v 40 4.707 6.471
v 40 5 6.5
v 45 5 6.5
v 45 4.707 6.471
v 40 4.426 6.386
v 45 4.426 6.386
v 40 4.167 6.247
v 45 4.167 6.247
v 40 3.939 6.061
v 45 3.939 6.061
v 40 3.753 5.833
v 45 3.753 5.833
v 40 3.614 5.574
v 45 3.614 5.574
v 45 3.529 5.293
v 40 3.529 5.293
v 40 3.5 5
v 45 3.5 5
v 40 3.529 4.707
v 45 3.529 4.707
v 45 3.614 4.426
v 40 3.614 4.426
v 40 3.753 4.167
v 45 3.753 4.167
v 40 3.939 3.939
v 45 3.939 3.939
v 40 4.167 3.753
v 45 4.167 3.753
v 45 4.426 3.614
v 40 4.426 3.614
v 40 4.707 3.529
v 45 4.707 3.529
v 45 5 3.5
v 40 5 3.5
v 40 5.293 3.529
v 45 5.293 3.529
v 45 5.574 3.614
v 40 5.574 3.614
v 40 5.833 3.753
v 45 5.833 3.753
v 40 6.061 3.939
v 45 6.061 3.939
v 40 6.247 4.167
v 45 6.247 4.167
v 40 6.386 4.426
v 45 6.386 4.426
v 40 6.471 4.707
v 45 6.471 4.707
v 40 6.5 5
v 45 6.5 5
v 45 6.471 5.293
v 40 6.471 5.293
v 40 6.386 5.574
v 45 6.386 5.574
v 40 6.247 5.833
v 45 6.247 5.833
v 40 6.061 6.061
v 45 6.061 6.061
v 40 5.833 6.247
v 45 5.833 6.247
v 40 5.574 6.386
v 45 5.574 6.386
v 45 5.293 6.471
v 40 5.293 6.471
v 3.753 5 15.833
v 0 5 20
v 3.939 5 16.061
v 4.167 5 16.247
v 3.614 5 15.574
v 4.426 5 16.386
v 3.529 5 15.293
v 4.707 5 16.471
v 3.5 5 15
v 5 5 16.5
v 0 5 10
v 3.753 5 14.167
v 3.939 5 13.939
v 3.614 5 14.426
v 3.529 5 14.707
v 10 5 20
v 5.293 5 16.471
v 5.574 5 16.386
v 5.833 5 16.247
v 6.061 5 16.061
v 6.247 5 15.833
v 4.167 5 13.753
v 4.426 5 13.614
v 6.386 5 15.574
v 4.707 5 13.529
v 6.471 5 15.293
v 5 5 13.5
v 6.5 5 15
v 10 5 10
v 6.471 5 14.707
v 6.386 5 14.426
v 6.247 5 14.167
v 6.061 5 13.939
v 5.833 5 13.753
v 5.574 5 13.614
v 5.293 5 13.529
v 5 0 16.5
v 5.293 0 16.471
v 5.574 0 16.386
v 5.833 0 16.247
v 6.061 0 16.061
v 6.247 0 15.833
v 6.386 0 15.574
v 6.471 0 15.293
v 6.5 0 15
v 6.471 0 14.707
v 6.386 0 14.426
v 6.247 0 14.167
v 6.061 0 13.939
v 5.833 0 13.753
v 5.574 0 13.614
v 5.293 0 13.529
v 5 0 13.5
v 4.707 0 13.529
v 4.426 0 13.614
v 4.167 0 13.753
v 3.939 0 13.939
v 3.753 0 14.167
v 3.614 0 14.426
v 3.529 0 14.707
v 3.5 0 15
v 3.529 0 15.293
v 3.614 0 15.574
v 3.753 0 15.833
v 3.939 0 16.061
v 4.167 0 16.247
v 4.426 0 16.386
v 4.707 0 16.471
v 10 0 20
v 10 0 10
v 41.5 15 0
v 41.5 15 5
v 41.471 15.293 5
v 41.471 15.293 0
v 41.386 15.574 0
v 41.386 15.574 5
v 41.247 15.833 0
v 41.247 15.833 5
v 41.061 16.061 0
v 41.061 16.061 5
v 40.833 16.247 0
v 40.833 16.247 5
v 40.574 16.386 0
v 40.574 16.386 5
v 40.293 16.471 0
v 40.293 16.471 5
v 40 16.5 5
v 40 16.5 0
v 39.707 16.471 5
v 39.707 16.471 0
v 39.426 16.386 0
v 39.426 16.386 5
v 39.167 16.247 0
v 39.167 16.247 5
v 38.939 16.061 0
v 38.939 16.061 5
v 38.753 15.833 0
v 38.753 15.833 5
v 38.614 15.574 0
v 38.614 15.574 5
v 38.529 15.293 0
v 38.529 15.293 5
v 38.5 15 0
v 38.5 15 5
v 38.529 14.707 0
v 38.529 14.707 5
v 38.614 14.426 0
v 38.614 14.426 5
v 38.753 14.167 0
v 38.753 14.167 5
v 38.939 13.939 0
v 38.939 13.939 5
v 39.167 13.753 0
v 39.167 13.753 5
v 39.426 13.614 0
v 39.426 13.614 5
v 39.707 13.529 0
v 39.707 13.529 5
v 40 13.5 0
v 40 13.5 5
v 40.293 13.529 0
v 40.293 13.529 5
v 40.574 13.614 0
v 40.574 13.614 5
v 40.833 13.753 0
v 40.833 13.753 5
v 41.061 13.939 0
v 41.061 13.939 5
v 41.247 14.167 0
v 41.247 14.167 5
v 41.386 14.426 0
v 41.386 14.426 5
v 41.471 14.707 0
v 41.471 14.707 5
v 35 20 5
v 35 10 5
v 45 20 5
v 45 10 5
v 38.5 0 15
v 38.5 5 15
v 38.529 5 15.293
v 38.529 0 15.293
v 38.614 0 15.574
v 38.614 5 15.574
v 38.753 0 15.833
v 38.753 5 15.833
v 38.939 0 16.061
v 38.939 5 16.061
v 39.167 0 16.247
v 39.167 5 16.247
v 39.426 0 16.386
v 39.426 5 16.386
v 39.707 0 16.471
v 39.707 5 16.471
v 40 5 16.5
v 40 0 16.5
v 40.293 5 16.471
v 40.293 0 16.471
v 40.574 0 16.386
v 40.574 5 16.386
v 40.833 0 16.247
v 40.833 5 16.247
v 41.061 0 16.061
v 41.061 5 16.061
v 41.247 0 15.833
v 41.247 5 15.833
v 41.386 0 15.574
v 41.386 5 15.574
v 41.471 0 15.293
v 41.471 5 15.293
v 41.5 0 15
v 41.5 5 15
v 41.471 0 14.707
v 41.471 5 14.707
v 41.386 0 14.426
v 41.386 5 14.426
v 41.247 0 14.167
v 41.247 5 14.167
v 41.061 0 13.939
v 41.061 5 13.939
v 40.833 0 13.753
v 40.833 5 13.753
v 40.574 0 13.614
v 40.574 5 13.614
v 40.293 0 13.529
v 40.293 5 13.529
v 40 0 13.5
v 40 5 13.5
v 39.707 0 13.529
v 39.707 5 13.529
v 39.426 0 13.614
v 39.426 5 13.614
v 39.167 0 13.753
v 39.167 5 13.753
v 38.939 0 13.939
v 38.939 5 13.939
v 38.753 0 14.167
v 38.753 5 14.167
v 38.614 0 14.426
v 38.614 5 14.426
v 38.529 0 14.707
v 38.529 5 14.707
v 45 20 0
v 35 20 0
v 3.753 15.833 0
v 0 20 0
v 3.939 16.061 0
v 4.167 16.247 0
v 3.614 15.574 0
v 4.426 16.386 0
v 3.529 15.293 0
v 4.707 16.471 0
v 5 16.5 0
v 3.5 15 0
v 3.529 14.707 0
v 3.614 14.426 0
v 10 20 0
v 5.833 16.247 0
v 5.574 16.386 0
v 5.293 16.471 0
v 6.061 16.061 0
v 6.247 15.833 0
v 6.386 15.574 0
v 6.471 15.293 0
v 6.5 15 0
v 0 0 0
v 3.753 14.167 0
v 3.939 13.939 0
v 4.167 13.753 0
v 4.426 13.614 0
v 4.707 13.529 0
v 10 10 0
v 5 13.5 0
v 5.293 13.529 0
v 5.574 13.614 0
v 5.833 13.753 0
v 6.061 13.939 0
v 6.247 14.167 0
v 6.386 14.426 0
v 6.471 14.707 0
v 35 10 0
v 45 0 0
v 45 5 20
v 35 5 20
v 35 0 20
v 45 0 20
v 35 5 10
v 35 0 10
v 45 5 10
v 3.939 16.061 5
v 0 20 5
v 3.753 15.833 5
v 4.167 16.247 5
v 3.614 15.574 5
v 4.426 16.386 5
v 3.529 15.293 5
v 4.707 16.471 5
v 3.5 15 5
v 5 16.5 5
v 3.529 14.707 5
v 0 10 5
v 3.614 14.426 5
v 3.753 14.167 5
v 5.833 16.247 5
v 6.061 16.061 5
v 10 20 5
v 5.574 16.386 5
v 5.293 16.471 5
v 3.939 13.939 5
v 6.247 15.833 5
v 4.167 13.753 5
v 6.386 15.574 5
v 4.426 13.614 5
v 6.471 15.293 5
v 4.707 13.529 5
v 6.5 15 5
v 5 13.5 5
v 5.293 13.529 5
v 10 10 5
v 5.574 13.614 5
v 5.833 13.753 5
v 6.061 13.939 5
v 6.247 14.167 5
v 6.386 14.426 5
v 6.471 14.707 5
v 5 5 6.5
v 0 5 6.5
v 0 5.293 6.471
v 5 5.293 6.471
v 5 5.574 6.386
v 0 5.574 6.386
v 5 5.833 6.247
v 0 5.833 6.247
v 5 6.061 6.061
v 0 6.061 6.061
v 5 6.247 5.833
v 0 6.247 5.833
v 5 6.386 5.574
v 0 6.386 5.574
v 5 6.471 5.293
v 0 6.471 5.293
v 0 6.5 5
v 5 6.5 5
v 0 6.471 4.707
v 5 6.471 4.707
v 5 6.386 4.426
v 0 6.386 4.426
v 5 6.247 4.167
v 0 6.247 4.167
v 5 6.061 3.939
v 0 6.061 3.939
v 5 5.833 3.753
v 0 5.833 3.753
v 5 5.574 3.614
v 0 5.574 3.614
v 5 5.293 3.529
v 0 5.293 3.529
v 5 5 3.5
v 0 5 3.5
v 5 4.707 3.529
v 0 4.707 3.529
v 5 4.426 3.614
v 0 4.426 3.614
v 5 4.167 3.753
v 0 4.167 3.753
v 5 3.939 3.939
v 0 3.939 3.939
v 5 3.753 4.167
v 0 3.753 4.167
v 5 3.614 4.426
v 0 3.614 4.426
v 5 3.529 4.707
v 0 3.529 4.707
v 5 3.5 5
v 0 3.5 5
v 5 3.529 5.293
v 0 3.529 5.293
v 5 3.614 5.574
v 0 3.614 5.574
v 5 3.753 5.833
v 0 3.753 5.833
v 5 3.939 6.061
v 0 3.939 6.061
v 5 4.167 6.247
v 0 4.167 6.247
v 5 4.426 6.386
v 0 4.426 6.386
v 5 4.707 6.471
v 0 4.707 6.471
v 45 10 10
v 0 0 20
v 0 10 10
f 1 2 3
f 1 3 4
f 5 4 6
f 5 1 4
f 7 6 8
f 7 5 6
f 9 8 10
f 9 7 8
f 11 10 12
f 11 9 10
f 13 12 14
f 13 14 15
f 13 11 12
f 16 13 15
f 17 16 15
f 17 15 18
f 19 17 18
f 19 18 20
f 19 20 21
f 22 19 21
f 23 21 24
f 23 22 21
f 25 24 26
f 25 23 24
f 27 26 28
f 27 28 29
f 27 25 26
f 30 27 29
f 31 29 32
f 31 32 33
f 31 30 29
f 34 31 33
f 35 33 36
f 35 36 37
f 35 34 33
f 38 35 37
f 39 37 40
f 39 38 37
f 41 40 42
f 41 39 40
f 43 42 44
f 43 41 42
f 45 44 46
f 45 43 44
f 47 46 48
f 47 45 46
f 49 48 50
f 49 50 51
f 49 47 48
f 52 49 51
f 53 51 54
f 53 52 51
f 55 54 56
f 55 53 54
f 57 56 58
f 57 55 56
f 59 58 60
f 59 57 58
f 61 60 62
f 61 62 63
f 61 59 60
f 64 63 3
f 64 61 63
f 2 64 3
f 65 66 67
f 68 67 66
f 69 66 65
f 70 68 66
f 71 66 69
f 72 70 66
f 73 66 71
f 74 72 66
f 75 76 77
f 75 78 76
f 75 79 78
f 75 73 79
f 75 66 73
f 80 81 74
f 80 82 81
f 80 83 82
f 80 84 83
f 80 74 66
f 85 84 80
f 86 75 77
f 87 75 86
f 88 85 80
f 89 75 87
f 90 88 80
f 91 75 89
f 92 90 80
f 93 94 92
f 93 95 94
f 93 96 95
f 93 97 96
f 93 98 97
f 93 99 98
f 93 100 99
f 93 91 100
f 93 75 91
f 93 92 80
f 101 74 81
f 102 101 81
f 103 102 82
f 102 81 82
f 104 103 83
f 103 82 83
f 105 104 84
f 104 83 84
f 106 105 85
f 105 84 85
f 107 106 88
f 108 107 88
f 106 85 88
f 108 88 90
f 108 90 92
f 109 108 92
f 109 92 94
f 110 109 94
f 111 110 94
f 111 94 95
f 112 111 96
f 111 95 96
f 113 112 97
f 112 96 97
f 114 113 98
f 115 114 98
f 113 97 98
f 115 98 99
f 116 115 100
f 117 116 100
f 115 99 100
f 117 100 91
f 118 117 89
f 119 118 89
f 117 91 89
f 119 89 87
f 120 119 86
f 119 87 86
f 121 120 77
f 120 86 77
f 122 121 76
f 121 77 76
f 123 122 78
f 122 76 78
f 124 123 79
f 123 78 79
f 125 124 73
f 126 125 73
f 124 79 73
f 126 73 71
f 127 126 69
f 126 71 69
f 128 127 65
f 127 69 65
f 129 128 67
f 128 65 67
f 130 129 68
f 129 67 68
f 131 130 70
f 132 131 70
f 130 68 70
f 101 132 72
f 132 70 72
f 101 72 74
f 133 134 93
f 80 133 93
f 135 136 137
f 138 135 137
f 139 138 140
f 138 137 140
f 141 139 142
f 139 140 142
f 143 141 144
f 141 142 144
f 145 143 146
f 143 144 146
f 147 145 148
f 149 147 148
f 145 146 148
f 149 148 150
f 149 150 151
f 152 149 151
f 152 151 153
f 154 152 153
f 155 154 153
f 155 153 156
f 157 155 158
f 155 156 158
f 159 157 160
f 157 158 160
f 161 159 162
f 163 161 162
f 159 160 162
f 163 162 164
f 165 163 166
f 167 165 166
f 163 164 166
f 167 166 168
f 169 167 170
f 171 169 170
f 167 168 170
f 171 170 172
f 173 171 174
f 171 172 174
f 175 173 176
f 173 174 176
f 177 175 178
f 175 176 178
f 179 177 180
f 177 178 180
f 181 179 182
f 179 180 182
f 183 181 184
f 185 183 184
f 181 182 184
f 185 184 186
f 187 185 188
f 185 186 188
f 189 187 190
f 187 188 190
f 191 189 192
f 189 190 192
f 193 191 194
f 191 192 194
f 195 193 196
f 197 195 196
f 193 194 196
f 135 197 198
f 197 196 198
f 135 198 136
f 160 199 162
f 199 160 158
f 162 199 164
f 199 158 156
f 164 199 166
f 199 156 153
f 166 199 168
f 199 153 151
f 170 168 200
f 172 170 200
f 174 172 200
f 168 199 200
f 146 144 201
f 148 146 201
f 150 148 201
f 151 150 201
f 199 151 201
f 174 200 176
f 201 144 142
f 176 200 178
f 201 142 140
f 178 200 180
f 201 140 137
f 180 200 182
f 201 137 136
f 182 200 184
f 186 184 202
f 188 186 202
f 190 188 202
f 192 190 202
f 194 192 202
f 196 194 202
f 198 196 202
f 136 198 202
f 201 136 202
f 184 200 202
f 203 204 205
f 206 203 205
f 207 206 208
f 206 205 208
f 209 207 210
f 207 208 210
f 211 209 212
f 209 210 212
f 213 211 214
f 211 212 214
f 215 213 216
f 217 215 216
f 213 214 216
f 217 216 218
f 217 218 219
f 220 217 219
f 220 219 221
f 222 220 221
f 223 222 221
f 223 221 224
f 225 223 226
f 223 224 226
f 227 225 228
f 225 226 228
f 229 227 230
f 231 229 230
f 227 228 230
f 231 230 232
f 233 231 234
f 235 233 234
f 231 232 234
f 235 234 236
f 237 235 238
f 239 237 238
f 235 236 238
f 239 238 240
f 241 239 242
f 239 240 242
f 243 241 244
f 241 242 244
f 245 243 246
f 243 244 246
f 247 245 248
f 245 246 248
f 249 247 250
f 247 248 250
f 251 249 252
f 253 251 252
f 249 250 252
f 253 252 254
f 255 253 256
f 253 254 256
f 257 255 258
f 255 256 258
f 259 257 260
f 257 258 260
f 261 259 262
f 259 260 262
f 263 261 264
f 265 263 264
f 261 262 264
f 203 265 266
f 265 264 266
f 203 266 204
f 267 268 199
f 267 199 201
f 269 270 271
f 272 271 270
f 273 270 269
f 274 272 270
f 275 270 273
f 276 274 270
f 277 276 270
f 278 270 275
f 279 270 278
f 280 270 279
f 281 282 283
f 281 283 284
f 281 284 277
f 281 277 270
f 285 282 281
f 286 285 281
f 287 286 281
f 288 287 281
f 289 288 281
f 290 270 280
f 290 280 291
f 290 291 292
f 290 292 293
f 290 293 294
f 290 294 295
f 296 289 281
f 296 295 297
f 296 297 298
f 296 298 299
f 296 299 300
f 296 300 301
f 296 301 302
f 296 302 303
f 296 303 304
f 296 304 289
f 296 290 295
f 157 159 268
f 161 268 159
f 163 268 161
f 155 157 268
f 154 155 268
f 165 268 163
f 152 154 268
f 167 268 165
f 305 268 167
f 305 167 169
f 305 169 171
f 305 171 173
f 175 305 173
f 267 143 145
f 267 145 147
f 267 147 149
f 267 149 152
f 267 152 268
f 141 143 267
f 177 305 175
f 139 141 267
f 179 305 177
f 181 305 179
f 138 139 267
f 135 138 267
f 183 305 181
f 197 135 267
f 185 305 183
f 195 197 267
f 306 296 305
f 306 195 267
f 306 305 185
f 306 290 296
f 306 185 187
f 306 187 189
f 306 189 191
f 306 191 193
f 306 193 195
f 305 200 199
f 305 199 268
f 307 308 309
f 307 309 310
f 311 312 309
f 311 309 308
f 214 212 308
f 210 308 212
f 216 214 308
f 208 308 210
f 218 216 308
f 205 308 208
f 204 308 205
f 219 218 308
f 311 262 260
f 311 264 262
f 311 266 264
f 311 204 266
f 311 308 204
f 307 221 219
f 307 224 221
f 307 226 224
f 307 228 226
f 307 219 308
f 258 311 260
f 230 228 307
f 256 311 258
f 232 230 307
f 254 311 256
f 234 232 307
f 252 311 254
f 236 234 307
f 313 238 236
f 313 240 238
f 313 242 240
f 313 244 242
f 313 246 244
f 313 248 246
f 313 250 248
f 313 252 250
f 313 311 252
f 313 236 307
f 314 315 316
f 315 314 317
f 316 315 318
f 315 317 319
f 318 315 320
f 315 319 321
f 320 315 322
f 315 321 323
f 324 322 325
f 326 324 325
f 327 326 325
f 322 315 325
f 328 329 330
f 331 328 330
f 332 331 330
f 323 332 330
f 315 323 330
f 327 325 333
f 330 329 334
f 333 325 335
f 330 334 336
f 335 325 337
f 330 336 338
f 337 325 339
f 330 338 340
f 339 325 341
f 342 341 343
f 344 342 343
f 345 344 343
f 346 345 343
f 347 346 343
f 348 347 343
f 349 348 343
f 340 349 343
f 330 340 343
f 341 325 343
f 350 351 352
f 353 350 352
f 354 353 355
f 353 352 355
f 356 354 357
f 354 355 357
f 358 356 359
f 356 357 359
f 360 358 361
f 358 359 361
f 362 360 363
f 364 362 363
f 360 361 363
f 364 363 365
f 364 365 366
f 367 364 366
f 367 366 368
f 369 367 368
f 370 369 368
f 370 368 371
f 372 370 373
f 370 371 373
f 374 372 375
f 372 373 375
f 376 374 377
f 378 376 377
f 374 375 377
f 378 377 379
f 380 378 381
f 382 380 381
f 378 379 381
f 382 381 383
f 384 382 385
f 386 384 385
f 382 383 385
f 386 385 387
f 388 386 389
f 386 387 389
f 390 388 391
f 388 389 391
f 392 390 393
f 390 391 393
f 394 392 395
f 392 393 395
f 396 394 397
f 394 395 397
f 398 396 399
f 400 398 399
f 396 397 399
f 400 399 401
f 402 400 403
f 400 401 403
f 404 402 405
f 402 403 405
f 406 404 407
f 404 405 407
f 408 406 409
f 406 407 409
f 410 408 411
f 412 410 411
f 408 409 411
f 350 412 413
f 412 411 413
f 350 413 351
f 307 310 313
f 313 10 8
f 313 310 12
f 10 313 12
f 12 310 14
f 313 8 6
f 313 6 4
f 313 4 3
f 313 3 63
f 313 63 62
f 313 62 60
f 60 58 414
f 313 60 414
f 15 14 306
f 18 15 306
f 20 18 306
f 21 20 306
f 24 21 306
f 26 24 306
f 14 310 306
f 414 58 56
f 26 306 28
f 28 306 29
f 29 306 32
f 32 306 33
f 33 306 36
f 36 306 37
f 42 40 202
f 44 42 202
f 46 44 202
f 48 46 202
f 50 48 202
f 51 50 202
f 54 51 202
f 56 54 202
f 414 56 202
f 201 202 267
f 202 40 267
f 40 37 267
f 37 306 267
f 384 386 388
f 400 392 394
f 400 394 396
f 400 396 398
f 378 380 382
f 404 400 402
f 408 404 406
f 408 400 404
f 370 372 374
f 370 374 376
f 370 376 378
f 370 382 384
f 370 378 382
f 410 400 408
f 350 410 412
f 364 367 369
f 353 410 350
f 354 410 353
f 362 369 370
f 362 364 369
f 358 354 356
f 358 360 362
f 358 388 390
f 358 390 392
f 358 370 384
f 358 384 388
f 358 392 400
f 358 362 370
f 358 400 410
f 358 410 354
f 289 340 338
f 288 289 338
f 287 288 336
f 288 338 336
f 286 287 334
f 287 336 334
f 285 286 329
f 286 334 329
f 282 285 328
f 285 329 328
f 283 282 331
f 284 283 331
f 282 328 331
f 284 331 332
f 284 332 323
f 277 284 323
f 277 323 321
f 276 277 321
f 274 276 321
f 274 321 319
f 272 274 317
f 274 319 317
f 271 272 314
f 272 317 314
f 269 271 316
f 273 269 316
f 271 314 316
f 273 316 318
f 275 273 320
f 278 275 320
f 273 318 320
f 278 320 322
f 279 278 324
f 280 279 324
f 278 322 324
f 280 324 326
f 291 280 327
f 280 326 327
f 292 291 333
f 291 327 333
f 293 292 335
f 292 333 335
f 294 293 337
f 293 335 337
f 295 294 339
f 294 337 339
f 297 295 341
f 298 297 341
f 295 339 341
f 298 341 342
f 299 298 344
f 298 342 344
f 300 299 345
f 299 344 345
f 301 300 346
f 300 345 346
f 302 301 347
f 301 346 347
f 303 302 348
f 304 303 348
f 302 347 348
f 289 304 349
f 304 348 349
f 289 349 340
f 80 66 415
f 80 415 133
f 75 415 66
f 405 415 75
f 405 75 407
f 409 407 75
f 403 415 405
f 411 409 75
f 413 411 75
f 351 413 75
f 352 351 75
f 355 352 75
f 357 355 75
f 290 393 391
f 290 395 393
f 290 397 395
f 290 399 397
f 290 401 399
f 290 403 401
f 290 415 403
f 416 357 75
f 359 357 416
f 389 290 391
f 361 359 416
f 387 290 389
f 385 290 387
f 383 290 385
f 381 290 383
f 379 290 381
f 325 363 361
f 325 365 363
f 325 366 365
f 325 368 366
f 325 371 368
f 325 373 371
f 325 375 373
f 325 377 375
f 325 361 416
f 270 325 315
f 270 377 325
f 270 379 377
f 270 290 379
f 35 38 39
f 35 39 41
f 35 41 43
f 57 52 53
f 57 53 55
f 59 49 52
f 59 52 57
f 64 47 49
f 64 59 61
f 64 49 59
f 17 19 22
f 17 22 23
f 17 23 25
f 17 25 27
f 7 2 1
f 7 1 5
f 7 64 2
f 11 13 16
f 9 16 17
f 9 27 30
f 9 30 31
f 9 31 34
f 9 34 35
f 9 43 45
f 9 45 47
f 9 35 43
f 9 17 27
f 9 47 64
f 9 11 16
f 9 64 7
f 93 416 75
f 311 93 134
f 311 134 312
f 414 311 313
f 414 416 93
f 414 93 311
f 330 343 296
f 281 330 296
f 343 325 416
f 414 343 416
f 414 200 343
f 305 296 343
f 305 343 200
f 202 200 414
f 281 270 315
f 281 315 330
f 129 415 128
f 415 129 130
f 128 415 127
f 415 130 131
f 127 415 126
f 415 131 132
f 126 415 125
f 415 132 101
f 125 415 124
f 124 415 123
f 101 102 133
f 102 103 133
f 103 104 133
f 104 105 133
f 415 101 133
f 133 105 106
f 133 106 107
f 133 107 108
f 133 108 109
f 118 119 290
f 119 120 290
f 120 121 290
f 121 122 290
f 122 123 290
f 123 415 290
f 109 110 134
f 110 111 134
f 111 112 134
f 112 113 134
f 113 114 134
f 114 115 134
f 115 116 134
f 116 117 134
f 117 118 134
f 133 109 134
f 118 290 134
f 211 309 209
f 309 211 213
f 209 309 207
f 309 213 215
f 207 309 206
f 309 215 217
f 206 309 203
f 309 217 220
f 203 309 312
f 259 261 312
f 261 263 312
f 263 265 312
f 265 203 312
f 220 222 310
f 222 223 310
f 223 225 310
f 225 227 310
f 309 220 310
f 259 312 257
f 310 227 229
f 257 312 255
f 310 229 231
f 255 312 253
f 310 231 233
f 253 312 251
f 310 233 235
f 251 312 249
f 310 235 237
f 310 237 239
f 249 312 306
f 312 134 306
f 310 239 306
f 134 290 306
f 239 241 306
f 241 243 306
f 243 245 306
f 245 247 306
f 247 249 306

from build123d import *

# Parameters (mm, degrees)
SKETCH1_W           = 45
SKETCH1_H           = 10
BOSS_EXTRUDE1_DEPTH = 10
SKETCH2_W           = 10
SKETCH2_H           = 5
BOSS_EXTRUDE2_DEPTH = 10
SKETCH3_W           = 10
SKETCH3_H           = 5
BOSS_EXTRUDE3_DEPTH = 10
SKETCH4_R           = 1.5
CUT_EXTRUDE1_DEPTH  = 5
SKETCH5_R           = 1.5
CUT_EXTRUDE2_DEPTH  = 5
SKETCH6_R           = 1.5
CUT_EXTRUDE3_DEPTH  = 5
CUT_EXTRUDE4_START  = -5
SKETCH7_R           = 1.5
CUT_EXTRUDE4_DEPTH  = 5
SKETCH8_R           = 1.5
CUT_EXTRUDE5_DEPTH  = 5
SKETCH9_R           = 1.5
CUT_EXTRUDE6_DEPTH  = 5


with BuildPart() as part:
    # Sketch1 → Boss-Extrude1 (new body)
    with BuildSketch(Plane.XY):
        with Locations((22.5, 5)):
            Rectangle(SKETCH1_W, SKETCH1_H)
    extrude(amount=BOSS_EXTRUDE1_DEPTH)

    # Sketch2 → Boss-Extrude2 (add)
    with BuildSketch(Plane(origin=(0, 10, 0), x_dir=(1, 0, 0), z_dir=(0, 1, 0))):
        with Locations((5, -2.5)):
            Rectangle(SKETCH2_W, SKETCH2_H)
        with Locations((40, -2.5)):
            Rectangle(SKETCH2_W, SKETCH2_H)
    extrude(amount=BOSS_EXTRUDE2_DEPTH)

    # Sketch3 → Boss-Extrude3 (add)
    with BuildSketch(Plane.XY.offset(10)):
        with Locations((5, 2.5)):
            Rectangle(SKETCH3_W, SKETCH3_H)
        with Locations((40, 2.5)):
            Rectangle(SKETCH3_W, SKETCH3_H)
    extrude(amount=BOSS_EXTRUDE3_DEPTH)

    # Sketch4 → Cut-Extrude1 (cut)
    with BuildSketch(Plane.ZY):
        with Locations((5, 5)):
            Circle(SKETCH4_R)
    extrude(amount=-CUT_EXTRUDE1_DEPTH, mode=Mode.SUBTRACT)

    # Sketch5 → Cut-Extrude2 (cut)
    with BuildSketch(Plane.XY.offset(5)):
        with Locations((5, 15)):
            Circle(SKETCH5_R)
    extrude(amount=-CUT_EXTRUDE2_DEPTH, mode=Mode.SUBTRACT)

    # Sketch6 → Cut-Extrude3 (cut)
    with BuildSketch(Plane(origin=(0, 5, 0), x_dir=(1, 0, 0), z_dir=(0, 1, 0))):
        with Locations(Location((5, -15, 0), (0, 0, 270))):
            Circle(SKETCH6_R)
    extrude(amount=-CUT_EXTRUDE3_DEPTH, mode=Mode.SUBTRACT)

    # Sketch7 → Cut-Extrude4 (cut)
    with BuildSketch(Plane(origin=(45, 0, 0), x_dir=(0, 0, -1), z_dir=(1, 0, 0)).offset(CUT_EXTRUDE4_START)):
        with Locations(Location((-5, 5, 0), (0, 0, 180))):
            Circle(SKETCH7_R)
    extrude(amount=CUT_EXTRUDE4_DEPTH, mode=Mode.SUBTRACT)

    # Sketch8 → Cut-Extrude5 (cut)
    with BuildSketch(Plane.XY.offset(5)):
        with Locations((40, 15)):
            Circle(SKETCH8_R)
    extrude(amount=-CUT_EXTRUDE5_DEPTH, mode=Mode.SUBTRACT)

    # Sketch9 → Cut-Extrude6 (cut)
    with BuildSketch(Plane(origin=(0, 5, 0), x_dir=(1, 0, 0), z_dir=(0, 1, 0))):
        with Locations(Location((40, -15, 0), (0, 0, 180))):
            Circle(SKETCH9_R)
    extrude(amount=-CUT_EXTRUDE6_DEPTH, mode=Mode.SUBTRACT)


solid = part.part
